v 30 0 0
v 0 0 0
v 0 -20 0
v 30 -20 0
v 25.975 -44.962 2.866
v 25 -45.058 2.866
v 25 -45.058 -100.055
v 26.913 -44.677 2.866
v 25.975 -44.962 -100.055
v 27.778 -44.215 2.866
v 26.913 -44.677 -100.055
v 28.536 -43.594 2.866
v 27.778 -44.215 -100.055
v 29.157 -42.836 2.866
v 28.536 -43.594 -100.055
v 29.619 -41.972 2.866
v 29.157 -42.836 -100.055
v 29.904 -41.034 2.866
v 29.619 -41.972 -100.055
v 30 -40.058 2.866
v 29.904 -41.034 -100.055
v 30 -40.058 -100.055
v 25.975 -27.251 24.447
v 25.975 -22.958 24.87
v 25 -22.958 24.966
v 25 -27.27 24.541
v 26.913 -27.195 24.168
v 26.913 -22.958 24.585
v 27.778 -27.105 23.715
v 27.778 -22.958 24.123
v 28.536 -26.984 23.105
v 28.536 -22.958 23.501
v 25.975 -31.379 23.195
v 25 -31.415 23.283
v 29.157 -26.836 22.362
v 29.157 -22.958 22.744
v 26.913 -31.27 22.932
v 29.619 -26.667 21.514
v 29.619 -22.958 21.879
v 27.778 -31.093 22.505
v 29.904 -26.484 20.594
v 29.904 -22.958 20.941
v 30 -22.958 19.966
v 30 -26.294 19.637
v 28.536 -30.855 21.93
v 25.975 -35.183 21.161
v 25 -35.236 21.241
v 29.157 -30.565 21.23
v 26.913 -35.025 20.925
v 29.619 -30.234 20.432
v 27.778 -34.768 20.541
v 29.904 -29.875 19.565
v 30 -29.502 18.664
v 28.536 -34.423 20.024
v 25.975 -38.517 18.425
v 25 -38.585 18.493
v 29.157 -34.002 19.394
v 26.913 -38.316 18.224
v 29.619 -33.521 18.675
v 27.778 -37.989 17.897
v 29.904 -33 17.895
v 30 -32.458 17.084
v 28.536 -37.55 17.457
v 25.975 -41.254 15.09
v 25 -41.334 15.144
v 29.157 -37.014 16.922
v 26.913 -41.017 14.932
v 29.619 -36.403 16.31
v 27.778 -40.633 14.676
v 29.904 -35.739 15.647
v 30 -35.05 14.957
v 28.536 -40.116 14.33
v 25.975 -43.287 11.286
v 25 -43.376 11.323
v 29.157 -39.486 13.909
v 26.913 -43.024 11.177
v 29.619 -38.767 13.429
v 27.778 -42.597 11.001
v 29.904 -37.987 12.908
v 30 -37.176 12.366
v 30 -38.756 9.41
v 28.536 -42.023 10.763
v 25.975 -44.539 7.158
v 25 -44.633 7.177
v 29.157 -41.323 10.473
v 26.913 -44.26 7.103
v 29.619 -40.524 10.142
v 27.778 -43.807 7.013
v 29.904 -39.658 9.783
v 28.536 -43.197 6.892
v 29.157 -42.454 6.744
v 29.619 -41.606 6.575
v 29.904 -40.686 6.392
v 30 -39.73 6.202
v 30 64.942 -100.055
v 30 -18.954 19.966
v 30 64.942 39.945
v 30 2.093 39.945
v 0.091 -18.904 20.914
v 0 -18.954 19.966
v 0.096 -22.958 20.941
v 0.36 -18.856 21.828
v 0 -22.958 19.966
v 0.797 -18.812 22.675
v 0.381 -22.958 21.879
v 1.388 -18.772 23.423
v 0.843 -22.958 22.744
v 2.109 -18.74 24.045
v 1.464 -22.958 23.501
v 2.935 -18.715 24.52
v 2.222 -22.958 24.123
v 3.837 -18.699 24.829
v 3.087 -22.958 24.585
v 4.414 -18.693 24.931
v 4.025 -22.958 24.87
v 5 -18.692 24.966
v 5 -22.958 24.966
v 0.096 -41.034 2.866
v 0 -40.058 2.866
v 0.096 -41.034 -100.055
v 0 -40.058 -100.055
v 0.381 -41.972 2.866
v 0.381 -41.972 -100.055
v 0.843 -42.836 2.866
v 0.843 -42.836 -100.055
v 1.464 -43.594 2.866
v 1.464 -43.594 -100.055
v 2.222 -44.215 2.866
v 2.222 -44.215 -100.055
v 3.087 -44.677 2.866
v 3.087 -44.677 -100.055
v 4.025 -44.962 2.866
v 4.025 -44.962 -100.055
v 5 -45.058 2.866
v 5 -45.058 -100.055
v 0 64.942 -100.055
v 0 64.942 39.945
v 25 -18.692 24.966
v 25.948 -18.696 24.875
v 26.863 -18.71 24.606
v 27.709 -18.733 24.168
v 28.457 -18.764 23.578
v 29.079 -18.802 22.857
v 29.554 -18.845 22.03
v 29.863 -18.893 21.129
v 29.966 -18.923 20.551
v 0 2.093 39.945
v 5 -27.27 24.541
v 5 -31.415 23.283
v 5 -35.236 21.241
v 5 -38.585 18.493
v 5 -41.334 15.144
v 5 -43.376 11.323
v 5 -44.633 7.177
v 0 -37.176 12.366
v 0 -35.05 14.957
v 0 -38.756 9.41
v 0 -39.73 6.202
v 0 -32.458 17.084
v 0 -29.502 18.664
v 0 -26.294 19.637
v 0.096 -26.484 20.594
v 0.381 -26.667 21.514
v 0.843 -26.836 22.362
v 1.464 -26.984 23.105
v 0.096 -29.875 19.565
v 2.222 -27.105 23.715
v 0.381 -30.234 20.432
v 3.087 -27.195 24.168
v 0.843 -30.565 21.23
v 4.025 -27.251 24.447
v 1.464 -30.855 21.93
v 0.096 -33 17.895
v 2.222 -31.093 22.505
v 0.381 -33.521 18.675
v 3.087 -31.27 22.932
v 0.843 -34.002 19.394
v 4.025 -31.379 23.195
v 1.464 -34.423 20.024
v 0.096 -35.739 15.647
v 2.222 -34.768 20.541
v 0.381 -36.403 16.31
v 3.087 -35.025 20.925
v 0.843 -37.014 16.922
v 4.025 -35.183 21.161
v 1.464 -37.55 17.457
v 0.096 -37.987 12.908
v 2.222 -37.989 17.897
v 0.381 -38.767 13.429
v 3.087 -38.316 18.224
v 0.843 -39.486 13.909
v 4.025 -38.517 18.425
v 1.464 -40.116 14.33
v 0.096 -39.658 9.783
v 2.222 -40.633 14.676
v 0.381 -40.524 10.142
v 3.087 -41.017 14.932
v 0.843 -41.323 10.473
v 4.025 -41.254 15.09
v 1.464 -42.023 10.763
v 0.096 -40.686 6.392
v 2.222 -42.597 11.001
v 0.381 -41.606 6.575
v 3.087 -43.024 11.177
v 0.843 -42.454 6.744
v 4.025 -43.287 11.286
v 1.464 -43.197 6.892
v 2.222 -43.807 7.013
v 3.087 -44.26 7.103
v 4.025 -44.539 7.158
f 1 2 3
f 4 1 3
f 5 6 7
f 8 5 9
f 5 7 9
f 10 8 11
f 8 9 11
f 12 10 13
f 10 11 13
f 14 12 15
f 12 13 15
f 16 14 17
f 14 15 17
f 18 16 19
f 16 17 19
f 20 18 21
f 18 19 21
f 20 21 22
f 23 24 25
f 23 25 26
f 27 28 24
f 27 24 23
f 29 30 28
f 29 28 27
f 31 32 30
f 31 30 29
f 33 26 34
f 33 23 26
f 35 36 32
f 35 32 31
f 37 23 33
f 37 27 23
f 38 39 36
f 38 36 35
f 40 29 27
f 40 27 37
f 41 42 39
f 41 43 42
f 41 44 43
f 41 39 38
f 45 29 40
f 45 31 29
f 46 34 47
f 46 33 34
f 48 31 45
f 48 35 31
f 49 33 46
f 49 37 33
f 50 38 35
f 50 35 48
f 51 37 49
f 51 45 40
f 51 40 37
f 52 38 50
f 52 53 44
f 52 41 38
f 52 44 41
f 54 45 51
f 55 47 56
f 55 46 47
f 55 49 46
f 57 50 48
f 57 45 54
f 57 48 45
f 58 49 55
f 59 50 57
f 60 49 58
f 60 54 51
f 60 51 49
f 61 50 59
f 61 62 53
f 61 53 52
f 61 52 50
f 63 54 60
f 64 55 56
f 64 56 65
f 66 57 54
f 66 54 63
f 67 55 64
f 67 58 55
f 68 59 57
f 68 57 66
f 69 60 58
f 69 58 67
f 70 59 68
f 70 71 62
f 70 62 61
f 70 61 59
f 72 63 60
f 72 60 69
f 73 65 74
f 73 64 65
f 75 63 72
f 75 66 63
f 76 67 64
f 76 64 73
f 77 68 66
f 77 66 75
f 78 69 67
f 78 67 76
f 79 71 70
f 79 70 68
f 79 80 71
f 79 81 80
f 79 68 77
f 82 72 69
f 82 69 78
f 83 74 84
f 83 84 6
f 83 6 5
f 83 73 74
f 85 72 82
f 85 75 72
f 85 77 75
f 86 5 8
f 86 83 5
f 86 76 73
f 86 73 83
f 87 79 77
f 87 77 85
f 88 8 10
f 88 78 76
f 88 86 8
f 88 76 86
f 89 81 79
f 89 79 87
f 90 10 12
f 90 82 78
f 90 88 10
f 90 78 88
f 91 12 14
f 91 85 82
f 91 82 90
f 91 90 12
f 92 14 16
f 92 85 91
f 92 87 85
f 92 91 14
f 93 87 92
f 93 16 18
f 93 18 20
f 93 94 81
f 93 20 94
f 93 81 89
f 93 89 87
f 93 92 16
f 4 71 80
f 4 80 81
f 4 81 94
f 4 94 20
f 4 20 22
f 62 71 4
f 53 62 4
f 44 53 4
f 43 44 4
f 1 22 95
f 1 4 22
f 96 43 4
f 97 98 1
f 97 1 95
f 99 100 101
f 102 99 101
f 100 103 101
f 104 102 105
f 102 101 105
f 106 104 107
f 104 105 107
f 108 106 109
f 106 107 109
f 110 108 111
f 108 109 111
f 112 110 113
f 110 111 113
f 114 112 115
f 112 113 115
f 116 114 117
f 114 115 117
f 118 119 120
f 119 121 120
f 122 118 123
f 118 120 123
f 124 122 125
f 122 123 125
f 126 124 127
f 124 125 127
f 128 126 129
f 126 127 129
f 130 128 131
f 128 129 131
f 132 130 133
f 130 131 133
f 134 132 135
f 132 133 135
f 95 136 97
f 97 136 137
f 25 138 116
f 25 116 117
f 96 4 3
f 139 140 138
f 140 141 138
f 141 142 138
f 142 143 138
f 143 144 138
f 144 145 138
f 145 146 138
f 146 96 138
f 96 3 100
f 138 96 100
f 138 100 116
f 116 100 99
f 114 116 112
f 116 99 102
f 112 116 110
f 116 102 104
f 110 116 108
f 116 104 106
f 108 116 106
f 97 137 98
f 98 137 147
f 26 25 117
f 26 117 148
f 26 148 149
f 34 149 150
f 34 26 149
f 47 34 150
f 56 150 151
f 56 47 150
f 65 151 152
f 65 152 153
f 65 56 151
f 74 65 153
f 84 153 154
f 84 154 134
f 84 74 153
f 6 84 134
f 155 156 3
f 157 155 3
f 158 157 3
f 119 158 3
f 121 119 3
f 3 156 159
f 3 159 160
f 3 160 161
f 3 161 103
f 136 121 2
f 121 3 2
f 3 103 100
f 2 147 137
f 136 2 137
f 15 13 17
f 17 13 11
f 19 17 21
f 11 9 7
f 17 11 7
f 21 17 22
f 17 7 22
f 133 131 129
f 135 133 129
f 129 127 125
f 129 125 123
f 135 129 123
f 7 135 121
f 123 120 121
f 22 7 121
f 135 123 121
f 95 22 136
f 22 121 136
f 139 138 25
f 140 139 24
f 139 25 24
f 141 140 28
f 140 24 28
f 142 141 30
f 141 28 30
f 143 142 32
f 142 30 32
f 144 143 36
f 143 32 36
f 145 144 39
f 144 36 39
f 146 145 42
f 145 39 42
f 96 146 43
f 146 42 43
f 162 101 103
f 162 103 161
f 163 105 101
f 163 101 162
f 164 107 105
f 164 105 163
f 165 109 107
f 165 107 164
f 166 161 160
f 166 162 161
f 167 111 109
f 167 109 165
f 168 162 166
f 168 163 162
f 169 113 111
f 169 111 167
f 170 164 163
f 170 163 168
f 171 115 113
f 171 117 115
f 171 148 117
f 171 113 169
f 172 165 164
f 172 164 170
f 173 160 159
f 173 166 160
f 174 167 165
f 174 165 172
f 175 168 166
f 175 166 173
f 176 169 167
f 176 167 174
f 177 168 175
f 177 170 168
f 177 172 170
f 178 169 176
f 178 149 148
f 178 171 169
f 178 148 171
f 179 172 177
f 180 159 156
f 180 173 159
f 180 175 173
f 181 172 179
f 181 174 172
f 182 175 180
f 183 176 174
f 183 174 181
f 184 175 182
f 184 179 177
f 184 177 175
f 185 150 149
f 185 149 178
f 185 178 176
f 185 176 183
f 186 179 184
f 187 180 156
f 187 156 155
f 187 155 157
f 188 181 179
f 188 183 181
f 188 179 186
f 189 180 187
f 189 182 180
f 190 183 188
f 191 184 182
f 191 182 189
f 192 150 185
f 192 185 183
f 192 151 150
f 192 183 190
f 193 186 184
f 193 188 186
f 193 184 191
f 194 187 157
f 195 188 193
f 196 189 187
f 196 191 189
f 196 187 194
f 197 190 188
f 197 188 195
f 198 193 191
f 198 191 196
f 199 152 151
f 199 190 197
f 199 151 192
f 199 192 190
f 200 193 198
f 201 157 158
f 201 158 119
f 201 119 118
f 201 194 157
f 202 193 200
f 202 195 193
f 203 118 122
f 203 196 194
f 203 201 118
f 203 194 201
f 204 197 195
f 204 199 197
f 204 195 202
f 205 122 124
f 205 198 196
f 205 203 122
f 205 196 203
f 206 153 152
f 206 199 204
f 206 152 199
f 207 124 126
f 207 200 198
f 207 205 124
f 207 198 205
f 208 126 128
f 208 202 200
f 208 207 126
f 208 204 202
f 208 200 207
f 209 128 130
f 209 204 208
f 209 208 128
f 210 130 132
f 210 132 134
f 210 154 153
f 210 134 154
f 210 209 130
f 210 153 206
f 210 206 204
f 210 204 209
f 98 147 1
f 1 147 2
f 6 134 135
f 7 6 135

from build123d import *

# Parameters (mm, degrees)
F1_DEPTH = 30
F2_R     = 22.1
F3_R     = 5


with BuildPart() as f1:
    # F0 (on Right) → F1 (new body)
    with BuildSketch(Plane.YZ):
        Polygon((2.0934382497, 39.9451813902), (0, 0), (-20, 0), (-18.6916010939, 24.9657383689), (-45.0580844926, 24.9657383689), (-45.0580844926, -100.0548186098), (64.9419155074, -100.0548186098), (64.9419155074, 39.9451813902), align=None)
    extrude(amount=F1_DEPTH)

    # F2
    f2_edges = [f1.edges().sort_by_distance(p)[0] for p in [
        (15, -45.058084, 24.965738),
    ]]
    fillet(f2_edges, radius=F2_R)

    # F3
    f3_edges = [f1.edges().sort_by_distance(p)[0] for p in [
        (30, -38.585144, 18.492798),
        (0, -38.585144, 18.492798),
        (30, -20.824843, 24.965738),
        (0, -20.824843, 24.965738),
    ]]
    fillet(f3_edges, radius=F3_R)


solid = f1.part
